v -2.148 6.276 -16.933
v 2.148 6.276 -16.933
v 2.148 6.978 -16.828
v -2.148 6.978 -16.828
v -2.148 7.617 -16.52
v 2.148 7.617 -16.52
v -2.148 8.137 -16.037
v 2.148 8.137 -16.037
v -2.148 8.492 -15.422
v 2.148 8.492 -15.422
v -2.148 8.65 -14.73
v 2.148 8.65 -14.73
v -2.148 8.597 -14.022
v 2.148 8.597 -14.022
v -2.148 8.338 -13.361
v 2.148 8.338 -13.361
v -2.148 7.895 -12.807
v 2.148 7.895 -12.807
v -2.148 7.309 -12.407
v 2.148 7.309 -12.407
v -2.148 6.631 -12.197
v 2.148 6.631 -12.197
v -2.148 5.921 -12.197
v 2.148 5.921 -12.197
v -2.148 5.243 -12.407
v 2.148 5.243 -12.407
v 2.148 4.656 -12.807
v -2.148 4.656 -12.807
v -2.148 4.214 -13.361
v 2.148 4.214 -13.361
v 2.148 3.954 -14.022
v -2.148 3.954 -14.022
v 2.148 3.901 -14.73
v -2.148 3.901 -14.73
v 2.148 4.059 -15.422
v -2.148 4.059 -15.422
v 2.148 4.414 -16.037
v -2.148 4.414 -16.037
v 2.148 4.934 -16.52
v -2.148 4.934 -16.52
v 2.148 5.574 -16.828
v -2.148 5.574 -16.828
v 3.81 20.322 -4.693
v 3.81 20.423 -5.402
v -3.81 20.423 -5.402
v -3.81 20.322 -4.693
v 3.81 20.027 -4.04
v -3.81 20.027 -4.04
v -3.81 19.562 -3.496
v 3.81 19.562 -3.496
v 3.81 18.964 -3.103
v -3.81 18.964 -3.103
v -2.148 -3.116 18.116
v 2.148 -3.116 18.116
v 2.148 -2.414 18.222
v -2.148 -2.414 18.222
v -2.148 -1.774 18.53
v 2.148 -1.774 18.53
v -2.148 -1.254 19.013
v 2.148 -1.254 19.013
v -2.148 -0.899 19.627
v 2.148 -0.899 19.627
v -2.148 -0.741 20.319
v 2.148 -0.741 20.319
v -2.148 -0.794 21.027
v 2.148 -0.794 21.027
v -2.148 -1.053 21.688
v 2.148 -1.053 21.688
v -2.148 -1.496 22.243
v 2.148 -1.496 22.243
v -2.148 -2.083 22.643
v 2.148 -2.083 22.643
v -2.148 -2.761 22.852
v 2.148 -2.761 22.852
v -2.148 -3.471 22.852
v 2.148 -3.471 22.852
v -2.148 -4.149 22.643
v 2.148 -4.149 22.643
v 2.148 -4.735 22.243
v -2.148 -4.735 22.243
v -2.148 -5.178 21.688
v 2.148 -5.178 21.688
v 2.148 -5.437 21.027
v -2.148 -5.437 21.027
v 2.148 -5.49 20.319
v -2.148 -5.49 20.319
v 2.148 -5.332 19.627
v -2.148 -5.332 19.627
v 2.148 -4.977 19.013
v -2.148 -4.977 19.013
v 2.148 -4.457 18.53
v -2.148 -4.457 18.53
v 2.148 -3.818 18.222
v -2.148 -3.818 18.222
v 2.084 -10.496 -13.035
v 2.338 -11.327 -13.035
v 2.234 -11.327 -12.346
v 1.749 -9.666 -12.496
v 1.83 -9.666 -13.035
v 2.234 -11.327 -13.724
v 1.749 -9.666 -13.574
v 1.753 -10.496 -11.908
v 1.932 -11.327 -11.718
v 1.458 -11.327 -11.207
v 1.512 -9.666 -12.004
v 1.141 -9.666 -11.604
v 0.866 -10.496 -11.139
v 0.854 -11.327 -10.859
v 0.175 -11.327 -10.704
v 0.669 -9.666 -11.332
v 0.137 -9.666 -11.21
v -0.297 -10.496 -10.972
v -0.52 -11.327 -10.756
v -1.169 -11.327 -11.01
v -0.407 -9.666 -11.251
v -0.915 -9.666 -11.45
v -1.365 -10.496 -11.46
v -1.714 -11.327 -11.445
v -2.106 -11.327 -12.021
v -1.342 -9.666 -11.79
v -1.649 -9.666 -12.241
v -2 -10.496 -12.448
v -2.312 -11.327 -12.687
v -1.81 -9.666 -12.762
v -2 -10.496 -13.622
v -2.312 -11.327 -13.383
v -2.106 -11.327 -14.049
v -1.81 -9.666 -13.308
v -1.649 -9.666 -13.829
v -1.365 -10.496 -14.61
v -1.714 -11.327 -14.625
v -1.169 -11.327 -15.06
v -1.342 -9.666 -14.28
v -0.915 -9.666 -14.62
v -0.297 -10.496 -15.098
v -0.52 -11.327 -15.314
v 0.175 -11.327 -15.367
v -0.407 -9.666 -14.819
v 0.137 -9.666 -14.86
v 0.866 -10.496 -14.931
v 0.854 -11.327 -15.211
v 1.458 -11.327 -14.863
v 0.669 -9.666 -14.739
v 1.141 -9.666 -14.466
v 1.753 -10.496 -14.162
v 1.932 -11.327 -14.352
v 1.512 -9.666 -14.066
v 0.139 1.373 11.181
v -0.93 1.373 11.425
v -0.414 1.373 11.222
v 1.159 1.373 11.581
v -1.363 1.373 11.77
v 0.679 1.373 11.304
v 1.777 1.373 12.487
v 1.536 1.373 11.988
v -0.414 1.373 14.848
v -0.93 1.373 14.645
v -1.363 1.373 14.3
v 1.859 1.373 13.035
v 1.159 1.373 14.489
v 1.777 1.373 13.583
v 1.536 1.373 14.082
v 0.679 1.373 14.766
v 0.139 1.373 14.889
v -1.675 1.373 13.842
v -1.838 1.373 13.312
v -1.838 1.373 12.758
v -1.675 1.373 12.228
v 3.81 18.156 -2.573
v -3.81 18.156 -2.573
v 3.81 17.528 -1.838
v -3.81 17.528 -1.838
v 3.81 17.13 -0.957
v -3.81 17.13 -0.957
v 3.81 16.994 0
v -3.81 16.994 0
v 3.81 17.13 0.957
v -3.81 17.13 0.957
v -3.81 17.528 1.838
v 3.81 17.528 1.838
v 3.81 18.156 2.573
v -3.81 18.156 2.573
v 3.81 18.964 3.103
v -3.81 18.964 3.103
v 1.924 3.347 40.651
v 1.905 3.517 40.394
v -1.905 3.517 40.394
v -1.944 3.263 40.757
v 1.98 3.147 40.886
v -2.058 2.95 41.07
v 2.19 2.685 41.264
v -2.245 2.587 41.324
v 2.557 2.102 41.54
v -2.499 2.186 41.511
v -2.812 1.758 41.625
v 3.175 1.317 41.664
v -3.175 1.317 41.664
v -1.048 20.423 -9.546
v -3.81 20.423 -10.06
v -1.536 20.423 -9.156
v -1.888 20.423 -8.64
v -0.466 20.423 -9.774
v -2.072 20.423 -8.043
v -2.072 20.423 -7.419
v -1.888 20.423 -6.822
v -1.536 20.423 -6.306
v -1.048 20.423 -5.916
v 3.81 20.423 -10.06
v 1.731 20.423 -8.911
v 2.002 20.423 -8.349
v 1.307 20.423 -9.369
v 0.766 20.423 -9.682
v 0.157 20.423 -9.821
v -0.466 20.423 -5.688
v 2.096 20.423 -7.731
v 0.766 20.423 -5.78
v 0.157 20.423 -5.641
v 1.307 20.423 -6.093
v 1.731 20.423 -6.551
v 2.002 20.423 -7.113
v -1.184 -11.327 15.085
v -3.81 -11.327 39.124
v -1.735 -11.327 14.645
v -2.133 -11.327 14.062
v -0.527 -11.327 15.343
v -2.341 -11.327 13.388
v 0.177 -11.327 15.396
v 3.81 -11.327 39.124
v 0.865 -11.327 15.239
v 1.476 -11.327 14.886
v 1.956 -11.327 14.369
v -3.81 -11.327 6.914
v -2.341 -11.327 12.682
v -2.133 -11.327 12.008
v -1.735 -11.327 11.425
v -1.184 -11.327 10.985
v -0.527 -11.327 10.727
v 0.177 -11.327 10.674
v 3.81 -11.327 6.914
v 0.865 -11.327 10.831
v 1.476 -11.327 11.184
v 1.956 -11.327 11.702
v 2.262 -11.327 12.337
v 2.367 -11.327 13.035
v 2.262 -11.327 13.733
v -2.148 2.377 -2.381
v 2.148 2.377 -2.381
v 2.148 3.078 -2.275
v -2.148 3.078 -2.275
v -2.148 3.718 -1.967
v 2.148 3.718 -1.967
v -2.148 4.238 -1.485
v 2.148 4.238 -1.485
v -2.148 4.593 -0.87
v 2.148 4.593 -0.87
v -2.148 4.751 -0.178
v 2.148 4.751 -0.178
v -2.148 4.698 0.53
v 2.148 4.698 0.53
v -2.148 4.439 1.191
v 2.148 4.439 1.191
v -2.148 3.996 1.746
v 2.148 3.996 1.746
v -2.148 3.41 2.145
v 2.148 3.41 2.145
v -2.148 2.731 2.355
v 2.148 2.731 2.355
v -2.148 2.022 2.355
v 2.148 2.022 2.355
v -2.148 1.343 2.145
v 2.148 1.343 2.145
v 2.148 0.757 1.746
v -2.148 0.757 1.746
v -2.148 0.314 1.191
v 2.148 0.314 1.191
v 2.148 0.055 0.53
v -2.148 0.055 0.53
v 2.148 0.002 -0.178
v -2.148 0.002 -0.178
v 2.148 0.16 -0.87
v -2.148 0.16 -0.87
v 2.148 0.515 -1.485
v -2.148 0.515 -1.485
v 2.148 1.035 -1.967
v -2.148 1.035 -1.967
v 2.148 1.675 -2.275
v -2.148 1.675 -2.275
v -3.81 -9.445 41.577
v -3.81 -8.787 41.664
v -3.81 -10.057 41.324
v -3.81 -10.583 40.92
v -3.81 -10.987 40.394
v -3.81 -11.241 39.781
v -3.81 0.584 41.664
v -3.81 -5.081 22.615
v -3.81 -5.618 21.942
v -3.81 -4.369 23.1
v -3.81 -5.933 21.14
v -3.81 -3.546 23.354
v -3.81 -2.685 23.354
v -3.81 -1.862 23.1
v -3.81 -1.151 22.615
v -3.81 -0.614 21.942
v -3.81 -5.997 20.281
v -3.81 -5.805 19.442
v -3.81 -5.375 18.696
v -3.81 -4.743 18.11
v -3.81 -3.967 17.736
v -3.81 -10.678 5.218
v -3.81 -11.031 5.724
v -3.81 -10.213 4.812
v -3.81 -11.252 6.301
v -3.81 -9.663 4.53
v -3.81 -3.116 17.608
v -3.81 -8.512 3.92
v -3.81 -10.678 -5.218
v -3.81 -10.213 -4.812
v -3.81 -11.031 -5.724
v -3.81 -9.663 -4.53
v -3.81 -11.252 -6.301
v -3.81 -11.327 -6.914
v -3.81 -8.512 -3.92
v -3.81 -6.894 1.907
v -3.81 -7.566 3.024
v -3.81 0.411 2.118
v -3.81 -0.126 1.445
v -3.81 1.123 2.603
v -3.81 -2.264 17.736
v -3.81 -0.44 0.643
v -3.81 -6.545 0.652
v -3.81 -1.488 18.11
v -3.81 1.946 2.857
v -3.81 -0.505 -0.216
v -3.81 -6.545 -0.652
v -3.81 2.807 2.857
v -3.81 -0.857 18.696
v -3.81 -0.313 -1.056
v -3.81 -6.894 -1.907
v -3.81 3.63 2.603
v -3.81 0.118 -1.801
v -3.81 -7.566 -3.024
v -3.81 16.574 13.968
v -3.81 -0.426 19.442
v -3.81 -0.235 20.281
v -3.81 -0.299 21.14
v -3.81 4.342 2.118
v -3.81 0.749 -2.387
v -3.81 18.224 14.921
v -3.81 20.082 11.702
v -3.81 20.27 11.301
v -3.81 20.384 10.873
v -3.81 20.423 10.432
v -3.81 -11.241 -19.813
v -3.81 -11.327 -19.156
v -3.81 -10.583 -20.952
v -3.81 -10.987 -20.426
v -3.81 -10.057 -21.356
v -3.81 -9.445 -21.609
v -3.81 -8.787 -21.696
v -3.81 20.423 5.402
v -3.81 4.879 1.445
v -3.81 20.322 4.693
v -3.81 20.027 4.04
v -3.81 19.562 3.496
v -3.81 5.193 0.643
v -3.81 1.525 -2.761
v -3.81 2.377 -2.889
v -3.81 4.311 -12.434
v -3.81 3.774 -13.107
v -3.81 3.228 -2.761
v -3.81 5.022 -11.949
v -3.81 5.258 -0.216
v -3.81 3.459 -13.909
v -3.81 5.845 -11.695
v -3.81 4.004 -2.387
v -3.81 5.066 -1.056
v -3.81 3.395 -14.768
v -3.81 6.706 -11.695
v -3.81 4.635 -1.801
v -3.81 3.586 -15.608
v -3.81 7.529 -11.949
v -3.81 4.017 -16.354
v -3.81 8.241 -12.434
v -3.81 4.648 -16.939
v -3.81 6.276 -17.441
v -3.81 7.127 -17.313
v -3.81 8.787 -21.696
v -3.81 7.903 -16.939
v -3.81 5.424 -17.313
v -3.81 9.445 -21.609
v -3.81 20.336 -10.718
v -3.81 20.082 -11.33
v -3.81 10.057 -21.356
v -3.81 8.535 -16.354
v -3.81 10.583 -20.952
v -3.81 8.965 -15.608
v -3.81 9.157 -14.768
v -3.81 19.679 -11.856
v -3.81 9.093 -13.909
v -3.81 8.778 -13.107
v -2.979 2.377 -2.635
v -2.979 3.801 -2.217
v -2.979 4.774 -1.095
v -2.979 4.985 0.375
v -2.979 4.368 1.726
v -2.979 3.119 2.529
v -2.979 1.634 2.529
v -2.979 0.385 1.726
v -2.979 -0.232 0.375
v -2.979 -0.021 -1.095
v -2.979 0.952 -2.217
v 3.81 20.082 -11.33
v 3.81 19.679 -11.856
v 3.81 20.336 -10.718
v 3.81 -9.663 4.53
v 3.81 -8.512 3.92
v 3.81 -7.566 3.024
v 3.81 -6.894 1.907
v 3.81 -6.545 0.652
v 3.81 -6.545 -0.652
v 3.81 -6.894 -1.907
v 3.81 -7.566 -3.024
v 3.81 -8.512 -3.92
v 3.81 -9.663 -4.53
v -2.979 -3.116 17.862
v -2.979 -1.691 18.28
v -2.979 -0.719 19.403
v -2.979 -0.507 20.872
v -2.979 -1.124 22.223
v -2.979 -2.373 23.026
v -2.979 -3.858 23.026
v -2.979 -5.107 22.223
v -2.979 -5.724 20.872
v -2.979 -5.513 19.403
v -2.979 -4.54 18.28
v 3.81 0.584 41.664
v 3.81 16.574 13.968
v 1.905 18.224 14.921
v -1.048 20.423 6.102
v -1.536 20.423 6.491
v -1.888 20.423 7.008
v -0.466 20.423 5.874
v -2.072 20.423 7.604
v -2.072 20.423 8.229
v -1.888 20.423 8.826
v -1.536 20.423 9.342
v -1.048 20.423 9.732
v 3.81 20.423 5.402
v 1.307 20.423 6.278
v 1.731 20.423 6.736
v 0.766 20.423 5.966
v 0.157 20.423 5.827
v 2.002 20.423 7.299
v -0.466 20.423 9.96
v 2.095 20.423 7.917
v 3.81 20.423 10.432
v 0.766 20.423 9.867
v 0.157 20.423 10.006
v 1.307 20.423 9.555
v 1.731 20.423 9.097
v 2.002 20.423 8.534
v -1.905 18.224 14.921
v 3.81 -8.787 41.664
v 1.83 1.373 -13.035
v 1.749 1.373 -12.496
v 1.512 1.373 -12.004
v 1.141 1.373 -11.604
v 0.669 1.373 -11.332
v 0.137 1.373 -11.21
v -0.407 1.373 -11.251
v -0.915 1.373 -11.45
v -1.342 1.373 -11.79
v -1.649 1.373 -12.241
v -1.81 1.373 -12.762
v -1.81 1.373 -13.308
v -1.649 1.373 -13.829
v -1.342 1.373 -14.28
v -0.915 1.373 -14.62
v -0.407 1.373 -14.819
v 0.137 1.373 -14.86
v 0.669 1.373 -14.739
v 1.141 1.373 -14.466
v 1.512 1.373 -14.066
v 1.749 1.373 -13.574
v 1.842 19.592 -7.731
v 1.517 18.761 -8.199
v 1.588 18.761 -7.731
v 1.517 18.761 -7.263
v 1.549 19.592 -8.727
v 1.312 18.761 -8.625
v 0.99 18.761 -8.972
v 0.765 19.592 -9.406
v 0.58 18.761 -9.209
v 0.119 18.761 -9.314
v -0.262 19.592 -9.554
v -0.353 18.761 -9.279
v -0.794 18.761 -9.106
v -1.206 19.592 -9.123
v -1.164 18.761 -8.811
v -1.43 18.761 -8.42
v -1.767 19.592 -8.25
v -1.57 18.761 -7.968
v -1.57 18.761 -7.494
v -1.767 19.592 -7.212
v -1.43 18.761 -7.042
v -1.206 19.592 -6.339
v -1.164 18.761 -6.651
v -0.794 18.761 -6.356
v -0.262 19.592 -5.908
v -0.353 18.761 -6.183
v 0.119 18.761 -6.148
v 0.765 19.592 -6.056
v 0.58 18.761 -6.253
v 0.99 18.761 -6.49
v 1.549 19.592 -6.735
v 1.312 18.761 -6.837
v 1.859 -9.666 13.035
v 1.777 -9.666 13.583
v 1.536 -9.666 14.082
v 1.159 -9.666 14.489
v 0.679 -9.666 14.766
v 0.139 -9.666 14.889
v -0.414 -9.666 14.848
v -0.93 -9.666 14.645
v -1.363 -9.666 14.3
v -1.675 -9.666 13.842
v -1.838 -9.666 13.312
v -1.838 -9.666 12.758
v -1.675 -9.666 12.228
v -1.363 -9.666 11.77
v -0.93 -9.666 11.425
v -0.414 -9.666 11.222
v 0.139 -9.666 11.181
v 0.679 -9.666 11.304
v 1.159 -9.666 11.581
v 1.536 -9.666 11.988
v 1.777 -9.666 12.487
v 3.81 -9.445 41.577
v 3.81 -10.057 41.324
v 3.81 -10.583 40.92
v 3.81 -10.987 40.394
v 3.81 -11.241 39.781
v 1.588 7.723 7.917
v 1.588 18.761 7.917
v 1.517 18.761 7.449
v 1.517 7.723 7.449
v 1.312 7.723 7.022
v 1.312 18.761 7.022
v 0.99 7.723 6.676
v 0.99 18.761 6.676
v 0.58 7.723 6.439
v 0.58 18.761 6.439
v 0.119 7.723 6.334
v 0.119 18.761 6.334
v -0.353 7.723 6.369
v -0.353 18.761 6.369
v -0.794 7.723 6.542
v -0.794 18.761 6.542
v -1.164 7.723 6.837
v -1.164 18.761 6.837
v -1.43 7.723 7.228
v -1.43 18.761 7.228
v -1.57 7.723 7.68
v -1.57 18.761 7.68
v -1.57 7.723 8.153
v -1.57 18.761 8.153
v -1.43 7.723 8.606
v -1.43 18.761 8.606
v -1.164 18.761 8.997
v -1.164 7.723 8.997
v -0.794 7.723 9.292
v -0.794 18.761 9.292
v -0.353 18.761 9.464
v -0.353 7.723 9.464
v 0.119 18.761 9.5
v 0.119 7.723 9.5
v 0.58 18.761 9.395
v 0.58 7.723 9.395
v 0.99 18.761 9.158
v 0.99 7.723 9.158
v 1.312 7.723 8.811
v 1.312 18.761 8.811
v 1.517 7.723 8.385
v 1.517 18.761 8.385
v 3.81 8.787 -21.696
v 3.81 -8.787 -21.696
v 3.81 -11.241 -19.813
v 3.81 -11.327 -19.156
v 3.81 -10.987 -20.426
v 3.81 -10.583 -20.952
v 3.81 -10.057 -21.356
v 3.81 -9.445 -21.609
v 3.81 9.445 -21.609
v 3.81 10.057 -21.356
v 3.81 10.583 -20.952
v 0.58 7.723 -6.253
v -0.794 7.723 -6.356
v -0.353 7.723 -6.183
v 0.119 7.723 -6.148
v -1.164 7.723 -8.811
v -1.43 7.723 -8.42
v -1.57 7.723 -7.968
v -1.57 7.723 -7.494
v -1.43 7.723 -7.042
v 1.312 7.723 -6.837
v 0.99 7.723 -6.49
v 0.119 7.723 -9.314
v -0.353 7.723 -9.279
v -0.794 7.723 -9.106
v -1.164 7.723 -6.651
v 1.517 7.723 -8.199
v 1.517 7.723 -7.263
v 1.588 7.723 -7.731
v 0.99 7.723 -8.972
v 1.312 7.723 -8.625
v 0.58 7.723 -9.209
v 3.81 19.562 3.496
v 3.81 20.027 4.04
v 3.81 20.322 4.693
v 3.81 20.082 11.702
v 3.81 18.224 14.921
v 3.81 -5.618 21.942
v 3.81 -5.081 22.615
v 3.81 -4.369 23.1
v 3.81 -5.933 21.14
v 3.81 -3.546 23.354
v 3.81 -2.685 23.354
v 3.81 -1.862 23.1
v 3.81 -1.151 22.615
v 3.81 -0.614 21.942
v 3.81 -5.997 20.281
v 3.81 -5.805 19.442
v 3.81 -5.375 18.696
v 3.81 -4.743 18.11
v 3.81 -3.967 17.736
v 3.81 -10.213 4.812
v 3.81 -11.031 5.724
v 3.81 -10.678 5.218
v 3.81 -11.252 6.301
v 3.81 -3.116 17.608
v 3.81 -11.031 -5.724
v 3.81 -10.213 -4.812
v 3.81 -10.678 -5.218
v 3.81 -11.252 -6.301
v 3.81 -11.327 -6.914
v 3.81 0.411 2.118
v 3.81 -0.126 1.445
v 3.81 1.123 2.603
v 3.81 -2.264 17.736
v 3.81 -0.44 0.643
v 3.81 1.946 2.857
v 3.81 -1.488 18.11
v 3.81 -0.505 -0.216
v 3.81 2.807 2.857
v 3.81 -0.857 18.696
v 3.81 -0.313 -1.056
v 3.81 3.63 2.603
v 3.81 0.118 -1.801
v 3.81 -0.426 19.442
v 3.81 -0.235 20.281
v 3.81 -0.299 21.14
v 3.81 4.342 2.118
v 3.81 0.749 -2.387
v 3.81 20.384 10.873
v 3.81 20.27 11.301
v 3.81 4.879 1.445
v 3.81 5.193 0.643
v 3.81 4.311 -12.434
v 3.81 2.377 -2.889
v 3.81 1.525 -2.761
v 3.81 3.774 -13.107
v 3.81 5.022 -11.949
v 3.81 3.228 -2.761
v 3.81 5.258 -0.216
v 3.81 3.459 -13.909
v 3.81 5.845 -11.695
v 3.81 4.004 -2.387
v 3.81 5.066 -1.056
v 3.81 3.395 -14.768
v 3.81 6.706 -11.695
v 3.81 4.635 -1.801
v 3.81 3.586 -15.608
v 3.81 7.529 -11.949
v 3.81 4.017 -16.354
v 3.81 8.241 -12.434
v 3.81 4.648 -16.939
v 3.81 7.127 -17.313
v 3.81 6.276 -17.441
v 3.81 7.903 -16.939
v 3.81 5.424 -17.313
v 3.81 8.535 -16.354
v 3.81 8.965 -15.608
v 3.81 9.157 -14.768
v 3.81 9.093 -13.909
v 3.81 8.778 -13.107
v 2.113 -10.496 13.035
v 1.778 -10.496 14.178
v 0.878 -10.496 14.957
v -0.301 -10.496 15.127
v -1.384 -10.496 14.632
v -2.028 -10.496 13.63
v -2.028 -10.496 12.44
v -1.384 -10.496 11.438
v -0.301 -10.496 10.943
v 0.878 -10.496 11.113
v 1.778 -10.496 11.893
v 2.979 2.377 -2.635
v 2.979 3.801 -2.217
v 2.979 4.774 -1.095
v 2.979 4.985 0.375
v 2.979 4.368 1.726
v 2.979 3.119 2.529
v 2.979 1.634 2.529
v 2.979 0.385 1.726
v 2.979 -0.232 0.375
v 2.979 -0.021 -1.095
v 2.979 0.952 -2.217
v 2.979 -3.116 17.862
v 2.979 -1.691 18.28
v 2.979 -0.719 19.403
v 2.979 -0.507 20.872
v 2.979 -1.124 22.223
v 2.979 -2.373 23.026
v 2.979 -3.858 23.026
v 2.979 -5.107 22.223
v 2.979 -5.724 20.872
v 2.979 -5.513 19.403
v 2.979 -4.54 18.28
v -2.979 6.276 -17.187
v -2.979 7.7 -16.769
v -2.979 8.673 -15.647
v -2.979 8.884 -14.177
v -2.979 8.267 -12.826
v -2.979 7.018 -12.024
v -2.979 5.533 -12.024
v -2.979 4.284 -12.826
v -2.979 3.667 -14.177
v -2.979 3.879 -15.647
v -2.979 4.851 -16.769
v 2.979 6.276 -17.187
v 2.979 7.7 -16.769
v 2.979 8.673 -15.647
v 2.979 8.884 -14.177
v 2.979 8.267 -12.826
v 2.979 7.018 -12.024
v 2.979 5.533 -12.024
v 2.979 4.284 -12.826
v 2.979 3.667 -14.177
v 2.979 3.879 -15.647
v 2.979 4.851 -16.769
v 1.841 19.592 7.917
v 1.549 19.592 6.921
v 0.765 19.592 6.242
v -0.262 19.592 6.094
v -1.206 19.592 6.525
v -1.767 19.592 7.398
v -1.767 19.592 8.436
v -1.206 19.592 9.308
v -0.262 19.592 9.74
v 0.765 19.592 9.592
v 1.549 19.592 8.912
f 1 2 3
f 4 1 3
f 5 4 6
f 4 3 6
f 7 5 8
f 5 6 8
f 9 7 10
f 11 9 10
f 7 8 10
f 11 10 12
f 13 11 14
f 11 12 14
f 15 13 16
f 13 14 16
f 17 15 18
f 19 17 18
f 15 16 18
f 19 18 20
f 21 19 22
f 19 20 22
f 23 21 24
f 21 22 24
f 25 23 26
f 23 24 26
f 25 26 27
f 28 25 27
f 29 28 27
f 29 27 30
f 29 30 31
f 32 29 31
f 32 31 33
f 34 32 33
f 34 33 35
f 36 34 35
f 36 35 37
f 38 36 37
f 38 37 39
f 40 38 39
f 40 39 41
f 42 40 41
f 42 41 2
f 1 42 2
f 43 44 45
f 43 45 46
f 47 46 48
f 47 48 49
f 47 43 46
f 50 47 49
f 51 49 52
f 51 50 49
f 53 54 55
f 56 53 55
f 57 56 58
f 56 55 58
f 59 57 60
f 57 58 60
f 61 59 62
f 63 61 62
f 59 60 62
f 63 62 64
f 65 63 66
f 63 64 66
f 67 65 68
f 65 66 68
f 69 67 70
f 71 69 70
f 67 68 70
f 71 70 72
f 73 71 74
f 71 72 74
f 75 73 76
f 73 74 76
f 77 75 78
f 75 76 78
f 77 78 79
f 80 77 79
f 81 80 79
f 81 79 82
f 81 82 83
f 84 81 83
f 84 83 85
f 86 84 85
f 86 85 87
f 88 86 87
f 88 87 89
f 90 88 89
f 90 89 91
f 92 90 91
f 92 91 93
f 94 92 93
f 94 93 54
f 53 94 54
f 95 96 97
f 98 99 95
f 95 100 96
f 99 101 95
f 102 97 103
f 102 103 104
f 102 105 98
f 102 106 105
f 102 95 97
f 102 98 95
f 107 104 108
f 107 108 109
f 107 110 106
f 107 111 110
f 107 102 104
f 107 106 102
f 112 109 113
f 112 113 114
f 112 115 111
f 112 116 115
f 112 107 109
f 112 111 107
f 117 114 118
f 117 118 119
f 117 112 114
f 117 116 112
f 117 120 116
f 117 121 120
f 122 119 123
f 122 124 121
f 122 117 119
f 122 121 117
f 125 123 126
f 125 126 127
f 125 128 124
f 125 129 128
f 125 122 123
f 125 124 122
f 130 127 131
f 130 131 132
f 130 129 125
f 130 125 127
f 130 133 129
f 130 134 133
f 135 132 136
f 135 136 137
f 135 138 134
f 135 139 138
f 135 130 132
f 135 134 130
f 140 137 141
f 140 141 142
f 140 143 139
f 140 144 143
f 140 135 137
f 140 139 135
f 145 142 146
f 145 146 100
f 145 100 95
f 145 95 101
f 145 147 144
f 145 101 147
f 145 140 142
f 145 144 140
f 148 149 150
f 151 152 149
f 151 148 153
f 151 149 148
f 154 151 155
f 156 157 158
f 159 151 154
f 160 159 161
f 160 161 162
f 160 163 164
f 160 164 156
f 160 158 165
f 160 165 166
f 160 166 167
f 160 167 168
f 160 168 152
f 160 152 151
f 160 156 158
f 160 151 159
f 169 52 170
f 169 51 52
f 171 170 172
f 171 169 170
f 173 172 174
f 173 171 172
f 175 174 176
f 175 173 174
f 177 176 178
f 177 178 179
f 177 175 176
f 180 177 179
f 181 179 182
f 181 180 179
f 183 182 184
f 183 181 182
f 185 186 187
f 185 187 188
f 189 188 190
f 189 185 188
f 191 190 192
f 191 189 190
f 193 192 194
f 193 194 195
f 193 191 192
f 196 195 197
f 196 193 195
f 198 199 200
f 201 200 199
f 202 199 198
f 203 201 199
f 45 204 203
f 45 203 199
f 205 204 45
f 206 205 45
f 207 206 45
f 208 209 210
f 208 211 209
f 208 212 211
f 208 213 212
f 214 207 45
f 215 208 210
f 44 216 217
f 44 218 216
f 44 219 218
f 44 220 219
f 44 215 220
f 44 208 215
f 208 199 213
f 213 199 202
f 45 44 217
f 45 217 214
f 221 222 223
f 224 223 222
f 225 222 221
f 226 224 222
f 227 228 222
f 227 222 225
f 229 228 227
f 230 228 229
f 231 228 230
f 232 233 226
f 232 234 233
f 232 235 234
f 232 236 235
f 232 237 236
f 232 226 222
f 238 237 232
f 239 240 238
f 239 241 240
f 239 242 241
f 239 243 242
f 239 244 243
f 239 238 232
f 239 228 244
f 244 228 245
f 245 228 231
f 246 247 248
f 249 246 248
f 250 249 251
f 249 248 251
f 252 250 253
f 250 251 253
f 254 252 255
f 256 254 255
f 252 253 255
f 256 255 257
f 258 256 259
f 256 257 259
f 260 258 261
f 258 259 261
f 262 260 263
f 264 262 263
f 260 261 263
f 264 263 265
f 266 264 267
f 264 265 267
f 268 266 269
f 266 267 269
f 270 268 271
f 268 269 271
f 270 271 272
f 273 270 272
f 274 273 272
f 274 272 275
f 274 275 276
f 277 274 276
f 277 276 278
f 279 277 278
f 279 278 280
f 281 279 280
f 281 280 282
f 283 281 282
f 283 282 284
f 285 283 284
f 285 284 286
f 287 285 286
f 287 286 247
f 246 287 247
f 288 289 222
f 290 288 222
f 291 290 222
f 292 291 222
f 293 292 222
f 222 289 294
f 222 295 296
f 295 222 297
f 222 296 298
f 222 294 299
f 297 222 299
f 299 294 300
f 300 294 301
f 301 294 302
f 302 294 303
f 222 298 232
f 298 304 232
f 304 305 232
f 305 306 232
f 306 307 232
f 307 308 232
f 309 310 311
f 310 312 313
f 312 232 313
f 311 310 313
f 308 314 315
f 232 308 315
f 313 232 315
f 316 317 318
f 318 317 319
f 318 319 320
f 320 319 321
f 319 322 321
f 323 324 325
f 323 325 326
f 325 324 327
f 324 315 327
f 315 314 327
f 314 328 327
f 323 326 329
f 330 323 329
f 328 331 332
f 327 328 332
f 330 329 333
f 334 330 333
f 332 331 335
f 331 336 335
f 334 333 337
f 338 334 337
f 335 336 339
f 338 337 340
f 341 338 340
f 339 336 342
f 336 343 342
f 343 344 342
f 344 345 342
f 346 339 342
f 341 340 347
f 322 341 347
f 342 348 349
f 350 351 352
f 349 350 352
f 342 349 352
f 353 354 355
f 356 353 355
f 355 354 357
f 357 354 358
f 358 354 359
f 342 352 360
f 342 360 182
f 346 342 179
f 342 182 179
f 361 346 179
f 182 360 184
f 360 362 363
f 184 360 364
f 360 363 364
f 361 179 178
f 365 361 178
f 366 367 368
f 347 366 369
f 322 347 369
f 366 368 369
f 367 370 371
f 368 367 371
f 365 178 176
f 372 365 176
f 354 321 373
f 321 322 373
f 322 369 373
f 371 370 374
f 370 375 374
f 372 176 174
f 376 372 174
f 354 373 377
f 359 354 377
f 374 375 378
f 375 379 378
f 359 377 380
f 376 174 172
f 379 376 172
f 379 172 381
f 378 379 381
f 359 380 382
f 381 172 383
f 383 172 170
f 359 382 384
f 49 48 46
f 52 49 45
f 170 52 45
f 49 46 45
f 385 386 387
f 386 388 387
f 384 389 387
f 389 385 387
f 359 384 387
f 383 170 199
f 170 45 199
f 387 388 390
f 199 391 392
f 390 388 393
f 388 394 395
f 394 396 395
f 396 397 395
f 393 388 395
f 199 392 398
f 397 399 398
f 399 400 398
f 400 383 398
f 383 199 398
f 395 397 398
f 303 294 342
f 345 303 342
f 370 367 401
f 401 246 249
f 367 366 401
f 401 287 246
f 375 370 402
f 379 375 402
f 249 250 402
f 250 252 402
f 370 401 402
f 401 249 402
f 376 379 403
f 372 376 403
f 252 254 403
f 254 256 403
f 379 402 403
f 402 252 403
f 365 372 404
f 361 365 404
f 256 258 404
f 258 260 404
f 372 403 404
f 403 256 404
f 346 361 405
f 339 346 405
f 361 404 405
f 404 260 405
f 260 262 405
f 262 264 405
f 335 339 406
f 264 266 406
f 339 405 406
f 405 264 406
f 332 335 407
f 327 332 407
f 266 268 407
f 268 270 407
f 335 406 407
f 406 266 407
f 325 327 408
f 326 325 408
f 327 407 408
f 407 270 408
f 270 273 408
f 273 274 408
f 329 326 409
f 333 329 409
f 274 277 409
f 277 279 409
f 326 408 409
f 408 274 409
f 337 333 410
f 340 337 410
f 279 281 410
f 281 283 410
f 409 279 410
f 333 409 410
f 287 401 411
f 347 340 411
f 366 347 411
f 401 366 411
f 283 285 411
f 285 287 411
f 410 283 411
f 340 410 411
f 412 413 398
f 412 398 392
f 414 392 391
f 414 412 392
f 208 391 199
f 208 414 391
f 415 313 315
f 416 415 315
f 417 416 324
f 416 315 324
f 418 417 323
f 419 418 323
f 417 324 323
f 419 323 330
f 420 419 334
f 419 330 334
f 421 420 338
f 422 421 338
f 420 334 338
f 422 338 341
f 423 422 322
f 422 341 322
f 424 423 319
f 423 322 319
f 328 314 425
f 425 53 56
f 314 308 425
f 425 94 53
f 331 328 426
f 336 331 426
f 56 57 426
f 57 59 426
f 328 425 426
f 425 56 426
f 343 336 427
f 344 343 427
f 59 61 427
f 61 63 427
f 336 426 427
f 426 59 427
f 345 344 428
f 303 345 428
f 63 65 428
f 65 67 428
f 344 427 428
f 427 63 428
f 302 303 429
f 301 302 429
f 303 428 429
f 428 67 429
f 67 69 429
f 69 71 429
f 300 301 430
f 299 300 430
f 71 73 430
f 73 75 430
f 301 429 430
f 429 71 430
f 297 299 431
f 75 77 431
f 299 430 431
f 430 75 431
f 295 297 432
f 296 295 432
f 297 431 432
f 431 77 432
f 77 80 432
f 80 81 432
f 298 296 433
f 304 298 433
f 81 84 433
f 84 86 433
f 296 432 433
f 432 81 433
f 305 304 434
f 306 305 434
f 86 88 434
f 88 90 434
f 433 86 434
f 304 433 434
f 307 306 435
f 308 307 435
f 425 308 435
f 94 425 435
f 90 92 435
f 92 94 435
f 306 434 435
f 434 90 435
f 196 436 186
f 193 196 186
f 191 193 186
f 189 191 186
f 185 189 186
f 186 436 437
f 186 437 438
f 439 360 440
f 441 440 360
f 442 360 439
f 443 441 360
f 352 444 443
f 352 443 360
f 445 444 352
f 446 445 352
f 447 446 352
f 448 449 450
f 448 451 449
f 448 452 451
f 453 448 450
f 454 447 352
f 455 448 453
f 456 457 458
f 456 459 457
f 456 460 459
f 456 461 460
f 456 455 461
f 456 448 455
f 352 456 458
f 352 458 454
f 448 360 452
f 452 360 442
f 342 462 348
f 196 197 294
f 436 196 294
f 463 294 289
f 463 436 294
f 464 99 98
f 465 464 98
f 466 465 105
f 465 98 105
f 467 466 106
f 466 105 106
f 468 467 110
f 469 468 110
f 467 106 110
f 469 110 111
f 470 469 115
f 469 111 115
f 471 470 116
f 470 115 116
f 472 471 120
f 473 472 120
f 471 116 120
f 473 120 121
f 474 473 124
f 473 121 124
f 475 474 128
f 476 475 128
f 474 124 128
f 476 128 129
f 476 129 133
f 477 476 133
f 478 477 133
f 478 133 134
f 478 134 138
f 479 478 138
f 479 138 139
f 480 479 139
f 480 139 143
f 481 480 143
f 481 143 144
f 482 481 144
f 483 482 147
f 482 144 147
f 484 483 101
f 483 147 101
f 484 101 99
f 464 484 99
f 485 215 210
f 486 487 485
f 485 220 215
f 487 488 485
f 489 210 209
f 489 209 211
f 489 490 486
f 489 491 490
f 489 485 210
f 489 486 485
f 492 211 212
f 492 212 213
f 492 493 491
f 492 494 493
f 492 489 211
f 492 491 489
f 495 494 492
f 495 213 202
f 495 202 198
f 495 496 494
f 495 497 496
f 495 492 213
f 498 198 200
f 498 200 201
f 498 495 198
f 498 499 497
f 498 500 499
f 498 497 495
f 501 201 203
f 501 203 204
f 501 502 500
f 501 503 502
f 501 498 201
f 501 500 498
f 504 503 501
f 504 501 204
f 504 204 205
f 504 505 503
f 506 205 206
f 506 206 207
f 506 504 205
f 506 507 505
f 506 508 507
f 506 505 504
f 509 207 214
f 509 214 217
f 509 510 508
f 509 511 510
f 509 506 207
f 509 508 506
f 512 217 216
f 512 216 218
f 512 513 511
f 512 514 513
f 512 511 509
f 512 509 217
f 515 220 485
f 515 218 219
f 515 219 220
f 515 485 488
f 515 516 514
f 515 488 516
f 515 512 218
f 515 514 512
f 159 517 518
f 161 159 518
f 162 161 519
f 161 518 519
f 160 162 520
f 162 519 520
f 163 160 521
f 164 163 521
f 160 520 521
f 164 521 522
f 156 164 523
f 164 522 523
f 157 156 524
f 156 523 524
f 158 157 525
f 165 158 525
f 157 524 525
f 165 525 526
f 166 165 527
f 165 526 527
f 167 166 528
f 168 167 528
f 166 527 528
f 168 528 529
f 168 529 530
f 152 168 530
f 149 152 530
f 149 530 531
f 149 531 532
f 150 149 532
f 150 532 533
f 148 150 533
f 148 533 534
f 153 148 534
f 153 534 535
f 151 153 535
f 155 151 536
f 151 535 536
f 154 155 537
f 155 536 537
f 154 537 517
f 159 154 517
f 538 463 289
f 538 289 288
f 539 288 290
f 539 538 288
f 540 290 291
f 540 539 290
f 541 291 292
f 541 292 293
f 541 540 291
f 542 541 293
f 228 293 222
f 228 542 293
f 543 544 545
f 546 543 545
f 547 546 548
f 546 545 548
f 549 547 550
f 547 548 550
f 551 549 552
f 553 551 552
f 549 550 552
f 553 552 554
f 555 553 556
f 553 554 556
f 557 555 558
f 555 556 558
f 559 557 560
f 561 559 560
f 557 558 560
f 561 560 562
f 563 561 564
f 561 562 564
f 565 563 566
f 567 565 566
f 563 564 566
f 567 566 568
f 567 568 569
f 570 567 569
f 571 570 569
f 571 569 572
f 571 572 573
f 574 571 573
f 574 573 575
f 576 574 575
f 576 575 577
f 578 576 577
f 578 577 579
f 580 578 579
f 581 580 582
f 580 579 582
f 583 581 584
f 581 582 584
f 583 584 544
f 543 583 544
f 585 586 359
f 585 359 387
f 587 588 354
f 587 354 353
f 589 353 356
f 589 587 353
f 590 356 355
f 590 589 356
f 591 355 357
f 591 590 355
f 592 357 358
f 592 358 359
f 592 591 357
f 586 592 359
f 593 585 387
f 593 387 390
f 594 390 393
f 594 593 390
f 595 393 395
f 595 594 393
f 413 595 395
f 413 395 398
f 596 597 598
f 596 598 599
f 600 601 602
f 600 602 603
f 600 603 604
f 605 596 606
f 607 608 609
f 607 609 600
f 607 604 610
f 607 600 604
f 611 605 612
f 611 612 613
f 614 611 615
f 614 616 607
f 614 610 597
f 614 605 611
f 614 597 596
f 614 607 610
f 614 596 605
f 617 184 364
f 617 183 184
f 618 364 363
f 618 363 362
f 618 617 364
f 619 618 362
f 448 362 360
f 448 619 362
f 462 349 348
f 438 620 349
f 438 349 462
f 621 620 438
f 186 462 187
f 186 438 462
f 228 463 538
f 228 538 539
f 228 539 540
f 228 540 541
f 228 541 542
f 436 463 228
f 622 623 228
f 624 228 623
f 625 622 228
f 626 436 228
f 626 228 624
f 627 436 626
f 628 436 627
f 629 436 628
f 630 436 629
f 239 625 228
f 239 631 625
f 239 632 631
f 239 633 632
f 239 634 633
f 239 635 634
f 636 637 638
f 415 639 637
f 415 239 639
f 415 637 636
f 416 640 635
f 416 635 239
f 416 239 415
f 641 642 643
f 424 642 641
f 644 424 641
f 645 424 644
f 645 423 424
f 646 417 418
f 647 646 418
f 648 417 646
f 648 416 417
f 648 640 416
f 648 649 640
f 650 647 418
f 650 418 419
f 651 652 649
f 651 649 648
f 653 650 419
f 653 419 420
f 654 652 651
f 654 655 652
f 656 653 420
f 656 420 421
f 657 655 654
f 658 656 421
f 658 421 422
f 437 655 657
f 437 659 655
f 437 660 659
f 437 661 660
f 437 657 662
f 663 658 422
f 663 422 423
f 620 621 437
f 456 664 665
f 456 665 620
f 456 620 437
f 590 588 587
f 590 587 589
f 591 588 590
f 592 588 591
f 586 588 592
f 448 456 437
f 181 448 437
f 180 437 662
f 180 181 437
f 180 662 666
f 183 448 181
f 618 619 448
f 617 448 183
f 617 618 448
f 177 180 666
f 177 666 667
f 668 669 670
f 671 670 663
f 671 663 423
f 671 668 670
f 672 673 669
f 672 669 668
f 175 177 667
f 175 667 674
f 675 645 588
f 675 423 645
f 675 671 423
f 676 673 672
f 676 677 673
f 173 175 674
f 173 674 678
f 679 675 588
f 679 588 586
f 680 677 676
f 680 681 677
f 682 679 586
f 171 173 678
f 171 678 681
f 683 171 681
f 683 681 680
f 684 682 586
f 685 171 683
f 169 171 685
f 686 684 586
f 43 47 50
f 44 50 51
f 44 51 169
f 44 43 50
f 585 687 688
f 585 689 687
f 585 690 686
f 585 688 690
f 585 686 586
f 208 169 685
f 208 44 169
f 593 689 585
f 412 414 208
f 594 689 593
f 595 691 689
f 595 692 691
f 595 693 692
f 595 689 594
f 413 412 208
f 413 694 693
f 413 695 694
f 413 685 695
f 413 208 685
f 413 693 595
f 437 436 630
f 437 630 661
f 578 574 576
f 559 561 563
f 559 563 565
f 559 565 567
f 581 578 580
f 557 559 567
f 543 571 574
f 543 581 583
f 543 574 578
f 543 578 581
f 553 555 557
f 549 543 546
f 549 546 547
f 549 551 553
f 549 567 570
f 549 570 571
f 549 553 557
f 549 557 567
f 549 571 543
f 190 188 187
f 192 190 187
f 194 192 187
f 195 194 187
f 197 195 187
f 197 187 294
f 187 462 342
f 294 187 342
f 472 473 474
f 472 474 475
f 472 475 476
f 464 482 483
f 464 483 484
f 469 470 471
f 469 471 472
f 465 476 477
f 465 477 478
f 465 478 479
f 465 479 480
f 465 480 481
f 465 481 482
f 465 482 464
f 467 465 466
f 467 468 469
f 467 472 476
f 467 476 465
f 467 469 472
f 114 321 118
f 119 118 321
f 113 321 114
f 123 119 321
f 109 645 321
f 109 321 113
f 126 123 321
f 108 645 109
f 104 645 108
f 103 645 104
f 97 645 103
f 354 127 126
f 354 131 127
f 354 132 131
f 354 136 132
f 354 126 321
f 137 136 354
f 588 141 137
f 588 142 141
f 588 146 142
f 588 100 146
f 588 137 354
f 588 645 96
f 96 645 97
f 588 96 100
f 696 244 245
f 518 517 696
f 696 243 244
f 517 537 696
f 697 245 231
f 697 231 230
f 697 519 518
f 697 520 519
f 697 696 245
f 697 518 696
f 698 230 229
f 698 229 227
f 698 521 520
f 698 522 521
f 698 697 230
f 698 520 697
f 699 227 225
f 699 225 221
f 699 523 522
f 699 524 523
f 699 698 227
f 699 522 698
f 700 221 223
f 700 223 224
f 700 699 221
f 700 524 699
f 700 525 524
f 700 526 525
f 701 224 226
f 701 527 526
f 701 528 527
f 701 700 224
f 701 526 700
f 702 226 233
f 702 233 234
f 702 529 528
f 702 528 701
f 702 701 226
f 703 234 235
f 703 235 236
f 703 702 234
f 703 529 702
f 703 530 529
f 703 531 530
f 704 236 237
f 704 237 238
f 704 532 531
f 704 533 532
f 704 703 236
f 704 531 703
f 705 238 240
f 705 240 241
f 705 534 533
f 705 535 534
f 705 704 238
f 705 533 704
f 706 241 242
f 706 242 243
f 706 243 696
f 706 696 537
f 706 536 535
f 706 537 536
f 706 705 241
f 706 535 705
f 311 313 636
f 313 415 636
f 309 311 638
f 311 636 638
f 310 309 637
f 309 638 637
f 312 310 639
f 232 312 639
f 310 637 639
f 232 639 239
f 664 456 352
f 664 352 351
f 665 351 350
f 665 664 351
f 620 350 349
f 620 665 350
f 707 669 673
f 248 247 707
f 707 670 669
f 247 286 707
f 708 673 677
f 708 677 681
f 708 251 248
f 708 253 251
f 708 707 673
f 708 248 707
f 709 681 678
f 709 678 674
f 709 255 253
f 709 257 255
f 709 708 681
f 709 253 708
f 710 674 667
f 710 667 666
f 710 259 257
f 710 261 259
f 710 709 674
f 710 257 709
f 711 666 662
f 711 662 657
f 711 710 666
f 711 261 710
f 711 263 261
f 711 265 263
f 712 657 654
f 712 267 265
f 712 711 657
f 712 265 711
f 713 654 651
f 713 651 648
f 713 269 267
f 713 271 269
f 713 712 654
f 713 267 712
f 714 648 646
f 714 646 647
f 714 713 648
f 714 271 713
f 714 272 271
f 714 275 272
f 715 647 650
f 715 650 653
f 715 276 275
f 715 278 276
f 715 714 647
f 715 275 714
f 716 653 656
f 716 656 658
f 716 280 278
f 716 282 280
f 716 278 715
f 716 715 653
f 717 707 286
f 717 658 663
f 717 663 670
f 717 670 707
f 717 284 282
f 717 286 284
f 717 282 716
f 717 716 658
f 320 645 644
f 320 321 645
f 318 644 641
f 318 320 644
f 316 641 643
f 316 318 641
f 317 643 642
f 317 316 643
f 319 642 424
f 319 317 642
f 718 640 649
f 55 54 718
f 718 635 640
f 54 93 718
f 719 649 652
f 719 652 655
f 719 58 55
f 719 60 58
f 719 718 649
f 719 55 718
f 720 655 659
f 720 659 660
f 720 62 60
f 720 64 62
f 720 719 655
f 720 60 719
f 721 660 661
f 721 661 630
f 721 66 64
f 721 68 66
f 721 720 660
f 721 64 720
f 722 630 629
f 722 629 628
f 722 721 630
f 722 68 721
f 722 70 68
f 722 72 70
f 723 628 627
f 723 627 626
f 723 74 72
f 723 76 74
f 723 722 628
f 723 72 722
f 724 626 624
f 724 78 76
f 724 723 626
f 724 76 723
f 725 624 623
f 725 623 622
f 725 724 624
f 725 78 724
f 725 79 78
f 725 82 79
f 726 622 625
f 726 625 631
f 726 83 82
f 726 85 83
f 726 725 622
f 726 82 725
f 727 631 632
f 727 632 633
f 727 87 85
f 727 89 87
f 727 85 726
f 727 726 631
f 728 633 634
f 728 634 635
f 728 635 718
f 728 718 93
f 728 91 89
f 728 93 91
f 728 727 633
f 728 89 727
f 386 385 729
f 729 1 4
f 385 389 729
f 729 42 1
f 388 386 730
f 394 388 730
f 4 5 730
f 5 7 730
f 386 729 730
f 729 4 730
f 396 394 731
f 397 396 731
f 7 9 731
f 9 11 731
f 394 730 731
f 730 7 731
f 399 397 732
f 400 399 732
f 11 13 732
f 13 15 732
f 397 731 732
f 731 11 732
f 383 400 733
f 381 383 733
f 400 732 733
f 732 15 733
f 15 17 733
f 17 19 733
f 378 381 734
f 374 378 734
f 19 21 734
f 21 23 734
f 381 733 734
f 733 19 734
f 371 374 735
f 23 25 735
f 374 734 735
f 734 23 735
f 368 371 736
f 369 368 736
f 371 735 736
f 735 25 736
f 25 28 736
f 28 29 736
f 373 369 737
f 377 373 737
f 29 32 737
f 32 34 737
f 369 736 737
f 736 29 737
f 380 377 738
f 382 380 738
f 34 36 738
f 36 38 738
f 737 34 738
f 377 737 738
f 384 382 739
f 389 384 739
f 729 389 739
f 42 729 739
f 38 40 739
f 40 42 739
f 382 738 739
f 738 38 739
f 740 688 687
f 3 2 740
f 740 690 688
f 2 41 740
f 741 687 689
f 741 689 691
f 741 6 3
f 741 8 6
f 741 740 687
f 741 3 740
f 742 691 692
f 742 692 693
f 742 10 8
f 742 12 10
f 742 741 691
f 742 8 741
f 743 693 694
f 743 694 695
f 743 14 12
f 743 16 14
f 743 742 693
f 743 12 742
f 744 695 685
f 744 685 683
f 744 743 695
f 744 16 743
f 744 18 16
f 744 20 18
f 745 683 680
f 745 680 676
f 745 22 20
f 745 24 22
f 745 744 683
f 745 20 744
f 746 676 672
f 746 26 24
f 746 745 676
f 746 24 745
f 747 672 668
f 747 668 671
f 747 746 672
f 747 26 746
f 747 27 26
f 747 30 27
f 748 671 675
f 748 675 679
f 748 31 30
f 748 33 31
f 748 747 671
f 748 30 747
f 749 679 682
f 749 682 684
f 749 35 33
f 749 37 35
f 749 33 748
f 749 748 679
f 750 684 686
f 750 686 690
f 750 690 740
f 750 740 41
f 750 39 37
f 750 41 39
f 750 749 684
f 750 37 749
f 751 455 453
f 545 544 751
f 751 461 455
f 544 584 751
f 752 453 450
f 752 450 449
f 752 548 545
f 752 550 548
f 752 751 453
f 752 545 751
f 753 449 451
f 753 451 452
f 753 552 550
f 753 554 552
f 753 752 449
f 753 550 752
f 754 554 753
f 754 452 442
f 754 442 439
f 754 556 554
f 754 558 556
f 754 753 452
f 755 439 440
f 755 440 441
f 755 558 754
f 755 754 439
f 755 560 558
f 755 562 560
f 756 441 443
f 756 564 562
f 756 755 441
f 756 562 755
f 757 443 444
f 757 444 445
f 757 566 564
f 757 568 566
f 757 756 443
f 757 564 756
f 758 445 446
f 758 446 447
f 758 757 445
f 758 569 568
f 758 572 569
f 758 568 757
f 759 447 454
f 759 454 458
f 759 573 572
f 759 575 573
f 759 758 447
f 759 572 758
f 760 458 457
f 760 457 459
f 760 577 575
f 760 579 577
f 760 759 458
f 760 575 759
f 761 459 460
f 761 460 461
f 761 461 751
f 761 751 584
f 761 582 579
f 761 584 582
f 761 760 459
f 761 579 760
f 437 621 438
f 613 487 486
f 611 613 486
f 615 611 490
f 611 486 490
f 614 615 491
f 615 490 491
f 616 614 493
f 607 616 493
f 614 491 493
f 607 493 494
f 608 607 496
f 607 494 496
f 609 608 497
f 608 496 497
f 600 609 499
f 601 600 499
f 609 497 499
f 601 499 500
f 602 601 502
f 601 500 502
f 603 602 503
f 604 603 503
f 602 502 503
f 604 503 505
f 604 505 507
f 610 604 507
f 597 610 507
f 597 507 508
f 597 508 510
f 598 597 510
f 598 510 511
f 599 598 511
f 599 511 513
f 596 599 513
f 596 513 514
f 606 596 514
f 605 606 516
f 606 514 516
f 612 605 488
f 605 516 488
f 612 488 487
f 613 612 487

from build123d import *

# Parameters (mm, degrees)
BOSS_EXTRUDE1_DEPTH     = 3.81
SKETCH2_R               = 2.38125
CUT_EXTRUDE1_DEPTH      = 8.62
CHAMFER1_SIZE           = 0.508
CHAMFER1_SIZE2          = 1.66159313
CHAMFER2_SIZE           = 0.508
CHAMFER2_SIZE2          = 1.66159313
CHAMFER3_SIZE           = 0.508
CHAMFER3_SIZE2          = 1.66159313
CHAMFER4_SIZE           = 0.508
CHAMFER4_SIZE2          = 1.66159313
SKETCH3_R               = 1.5875
CUT_EXTRUDE2_DEPTH      = 12.7
CHAMFER5_SIZE           = 0.508
CHAMFER5_SIZE2          = 1.66159313
CHAMFER5_PART_2_SIZE    = 0.508
CHAMFER5_PART_2_SIZE2   = 1.66159313
SKETCH4_R               = 4.826
CUT_EXTRUDE3_DEPTH      = 8.62
FILLET1_R               = 2.54
SKETCH5_R               = 1.830021078
SKETCH5_R_2             = 1.859210554
CUT_EXTRUDE4_DEPTH      = 12.7
CHAMFER6_SIZE           = 0.508
CHAMFER6_SIZE2          = 1.66159313
CHAMFER6_PART_2_SIZE    = 0.508
CHAMFER6_PART_2_SIZE2   = 1.66159313
CUT_EXTRUDE7_START      = 10.16
CUT_EXTRUDE7_DEPTH      = 42.745681687
CUT_EXTRUDE7_DEPTH_BACK = 6.35


with BuildPart() as part:
    # Sketch1 → Boss-Extrude1 (new body, symmetric)
    with BuildSketch(Plane(origin=(0, 0, 0), x_dir=(0, 0, -1), z_dir=(1, 0, 0))):
        with BuildLine():
            Line((-5.401607261, 20.422717891), (-10.431909051, 20.422717891))
            ThreePointArc((-10.431909051, 20.422717891), (-11.089309426, 20.33616949), (-11.701909051, 20.082422416))
            Line((-11.701909051, 20.082422416), (-40.393951745, 3.517063844))
            ThreePointArc((-40.393951745, 3.517063844), (-41.32365627, 2.587359318), (-41.663951745, 1.317359318))
            Line((-41.663951745, 1.317359318), (-41.663951745, -8.787282109))
            ThreePointArc((-41.663951745, -8.787282109), (-40.920002969, -10.583333333), (-39.123951745, -11.327282109))
            Line((-39.123951745, -11.327282109), (19.155833333, -11.327282109))
            ThreePointArc((19.155833333, -11.327282109), (20.951884558, -10.583333333), (21.695833333, -8.787282109))
            Line((21.695833333, -8.787282109), (21.695833333, 8.787282109))
            ThreePointArc((21.695833333, 8.787282109), (21.502487346, 9.759298027), (20.951884558, 10.583333333))
            Line((20.951884558, 10.583333333), (11.856448776, 19.678769115))
            ThreePointArc((11.856448776, 19.678769115), (11.03241347, 20.229371903), (10.060397552, 20.422717891))
            Line((10.060397552, 20.422717891), (5.401607261, 20.422717891))
            ThreePointArc((5.401607261, 20.422717891), (4.040314071, 20.027124767), (3.10305098, 18.963568955))
            ThreePointArc((3.10305098, 18.963568955), (0, 16.993717891), (-3.10305098, 18.963568955))
            ThreePointArc((-3.10305098, 18.963568955), (-4.040314071, 20.027124767), (-5.401607261, 20.422717891))
        make_face()
    extrude(amount=BOSS_EXTRUDE1_DEPTH, both=True)

    # Sketch2 → Cut-Extrude1 (cut, through all)
    with BuildSketch(Plane(origin=(3.81, 0, 0), x_dir=(0, 0, -1), z_dir=(1, 0, 0))):
        with Locations((14.552083333, 6.275759092)):
            Circle(SKETCH2_R)
        with Locations((0, 2.376540114)):
            Circle(SKETCH2_R)
        with Locations((-20.497285078, -3.115690869)):
            Circle(SKETCH2_R)
    extrude(amount=-CUT_EXTRUDE1_DEPTH, mode=Mode.SUBTRACT)

    # Chamfer1
    chamfer1_edges = [part.edges().sort_by_distance(p)[0] for p in [
        (3.81, 6.275759092, -12.170833333),
        (3.81, 2.376540114, 2.38125),
        (3.81, -3.115690869, 22.878535078),
    ]]
    chamfer1_side = [part.faces().sort_by_distance(p)[0] for p in [
        (3.81, 2.381626515, 7.750929536),
    ]]
    chamfer(chamfer1_edges, length=CHAMFER1_SIZE, length2=CHAMFER1_SIZE2, reference=chamfer1_side[0])

    # Chamfer2
    chamfer2_edges = [part.edges().sort_by_distance(p)[0] for p in [
        (-3.81, -3.115690869, 22.878535078),
    ]]
    chamfer2_side = [part.faces().sort_by_distance(p)[0] for p in [
        (-3.81, 2.381626515, 7.750929536),
    ]]
    chamfer(chamfer2_edges, length=CHAMFER2_SIZE, length2=CHAMFER2_SIZE2, reference=chamfer2_side[0])

    # Chamfer3
    chamfer3_edges = [part.edges().sort_by_distance(p)[0] for p in [
        (-3.81, 2.376540114, 2.38125),
    ]]
    chamfer3_side = [part.faces().sort_by_distance(p)[0] for p in [
        (-3.81, 2.410504504, 7.683971585),
    ]]
    chamfer(chamfer3_edges, length=CHAMFER3_SIZE, length2=CHAMFER3_SIZE2, reference=chamfer3_side[0])

    # Chamfer4
    chamfer4_edges = [part.edges().sort_by_distance(p)[0] for p in [
        (-3.81, 6.275759092, -12.170833333),
    ]]
    chamfer4_side = [part.faces().sort_by_distance(p)[0] for p in [
        (-3.81, 2.410683864, 7.724549459),
    ]]
    chamfer(chamfer4_edges, length=CHAMFER4_SIZE, length2=CHAMFER4_SIZE2, reference=chamfer4_side[0])

    # Sketch3 → Cut-Extrude2 (cut)
    with BuildSketch(Plane(origin=(0, 20.422717891, 0), x_dir=(1, 0, 0), z_dir=(0, 1, 0))):
        with Locations((0, -7.916758156)):
            Circle(SKETCH3_R)
        with Locations((0, 7.731002406)):
            Circle(SKETCH3_R)
    extrude(amount=-CUT_EXTRUDE2_DEPTH, mode=Mode.SUBTRACT)

    # Chamfer5
    chamfer5_edges = [part.edges().sort_by_distance(p)[0] for p in [
        (-1.5875, 20.422717891, 7.916758156),
    ]]
    chamfer5_side = [part.faces().sort_by_distance(p)[0] for p in [
        (0, 20.422717891, 5.492913524),
    ]]
    chamfer(chamfer5_edges, length=CHAMFER5_SIZE, length2=CHAMFER5_SIZE2, reference=chamfer5_side[0])

    # Chamfer5 part 2
    chamfer5_part_2_edges = [part.edges().sort_by_distance(p)[0] for p in [
        (-1.5875, 20.422717891, -7.731002406),
    ]]
    chamfer5_part_2_side = [part.faces().sort_by_distance(p)[0] for p in [
        (0, 20.422717891, -9.971084212),
    ]]
    chamfer(chamfer5_part_2_edges, length=CHAMFER5_PART_2_SIZE, length2=CHAMFER5_PART_2_SIZE2, reference=chamfer5_part_2_side[0])

    # Sketch4 → Cut-Extrude3 (cut, through all)
    with BuildSketch(Plane.ZY.offset(3.81)):
        with Locations((0, -11.327282109)):
            Circle(SKETCH4_R)
    extrude(amount=-CUT_EXTRUDE3_DEPTH, mode=Mode.SUBTRACT)

    # Fillet1
    fillet1_edges = [part.edges().sort_by_distance(p)[0] for p in [
        (0, -11.327282109, -4.826),
        (0, -11.327282109, 4.826),
    ]]
    fillet(fillet1_edges, radius=FILLET1_R)

    # Sketch5 → Cut-Extrude4 (cut)
    with BuildSketch(Plane.XZ.offset(11.327282109)):
        with Locations((0, -13.035023694)):
            Circle(SKETCH5_R)
        with Locations((0, 13.035023694)):
            Circle(SKETCH5_R_2)
    extrude(amount=-CUT_EXTRUDE4_DEPTH, mode=Mode.SUBTRACT)

    # Chamfer6
    chamfer6_edges = [part.edges().sort_by_distance(p)[0] for p in [
        (-1.830021078, -11.327282109, -13.035023694),
    ]]
    chamfer6_side = [part.faces().sort_by_distance(p)[0] for p in [
        (3.665805117, -11.327282109, -13.035023694),
    ]]
    chamfer(chamfer6_edges, length=CHAMFER6_SIZE, length2=CHAMFER6_SIZE2, reference=chamfer6_side[0])

    # Chamfer6 part 2
    chamfer6_part_2_edges = [part.edges().sort_by_distance(p)[0] for p in [
        (-1.859210554, -11.327282109, 13.035023694),
    ]]
    chamfer6_part_2_side = [part.faces().sort_by_distance(p)[0] for p in [
        (0, -11.327282109, 23.481278136),
    ]]
    chamfer(chamfer6_part_2_edges, length=CHAMFER6_PART_2_SIZE, length2=CHAMFER6_PART_2_SIZE2, reference=chamfer6_part_2_side[0])

    # Sketch7 → Cut-Extrude7 (cut, two sides)
    with BuildSketch(Plane(origin=(0, 0, 0), x_dir=(1, 0, 0), z_dir=(0, -0.5, 0.866025404)).offset(CUT_EXTRUDE7_START)) as cut_extrude7_sk:
        Polygon((-10.16, 27.687842508), (10.16, 27.687842508), (10.16, 14.987842508), (0, 25.147842508), (-10.16, 14.987842508), align=None)
    extrude(amount=CUT_EXTRUDE7_DEPTH, mode=Mode.SUBTRACT)
    extrude(cut_extrude7_sk.sketch, amount=-CUT_EXTRUDE7_DEPTH_BACK, mode=Mode.SUBTRACT)


solid = part.part
